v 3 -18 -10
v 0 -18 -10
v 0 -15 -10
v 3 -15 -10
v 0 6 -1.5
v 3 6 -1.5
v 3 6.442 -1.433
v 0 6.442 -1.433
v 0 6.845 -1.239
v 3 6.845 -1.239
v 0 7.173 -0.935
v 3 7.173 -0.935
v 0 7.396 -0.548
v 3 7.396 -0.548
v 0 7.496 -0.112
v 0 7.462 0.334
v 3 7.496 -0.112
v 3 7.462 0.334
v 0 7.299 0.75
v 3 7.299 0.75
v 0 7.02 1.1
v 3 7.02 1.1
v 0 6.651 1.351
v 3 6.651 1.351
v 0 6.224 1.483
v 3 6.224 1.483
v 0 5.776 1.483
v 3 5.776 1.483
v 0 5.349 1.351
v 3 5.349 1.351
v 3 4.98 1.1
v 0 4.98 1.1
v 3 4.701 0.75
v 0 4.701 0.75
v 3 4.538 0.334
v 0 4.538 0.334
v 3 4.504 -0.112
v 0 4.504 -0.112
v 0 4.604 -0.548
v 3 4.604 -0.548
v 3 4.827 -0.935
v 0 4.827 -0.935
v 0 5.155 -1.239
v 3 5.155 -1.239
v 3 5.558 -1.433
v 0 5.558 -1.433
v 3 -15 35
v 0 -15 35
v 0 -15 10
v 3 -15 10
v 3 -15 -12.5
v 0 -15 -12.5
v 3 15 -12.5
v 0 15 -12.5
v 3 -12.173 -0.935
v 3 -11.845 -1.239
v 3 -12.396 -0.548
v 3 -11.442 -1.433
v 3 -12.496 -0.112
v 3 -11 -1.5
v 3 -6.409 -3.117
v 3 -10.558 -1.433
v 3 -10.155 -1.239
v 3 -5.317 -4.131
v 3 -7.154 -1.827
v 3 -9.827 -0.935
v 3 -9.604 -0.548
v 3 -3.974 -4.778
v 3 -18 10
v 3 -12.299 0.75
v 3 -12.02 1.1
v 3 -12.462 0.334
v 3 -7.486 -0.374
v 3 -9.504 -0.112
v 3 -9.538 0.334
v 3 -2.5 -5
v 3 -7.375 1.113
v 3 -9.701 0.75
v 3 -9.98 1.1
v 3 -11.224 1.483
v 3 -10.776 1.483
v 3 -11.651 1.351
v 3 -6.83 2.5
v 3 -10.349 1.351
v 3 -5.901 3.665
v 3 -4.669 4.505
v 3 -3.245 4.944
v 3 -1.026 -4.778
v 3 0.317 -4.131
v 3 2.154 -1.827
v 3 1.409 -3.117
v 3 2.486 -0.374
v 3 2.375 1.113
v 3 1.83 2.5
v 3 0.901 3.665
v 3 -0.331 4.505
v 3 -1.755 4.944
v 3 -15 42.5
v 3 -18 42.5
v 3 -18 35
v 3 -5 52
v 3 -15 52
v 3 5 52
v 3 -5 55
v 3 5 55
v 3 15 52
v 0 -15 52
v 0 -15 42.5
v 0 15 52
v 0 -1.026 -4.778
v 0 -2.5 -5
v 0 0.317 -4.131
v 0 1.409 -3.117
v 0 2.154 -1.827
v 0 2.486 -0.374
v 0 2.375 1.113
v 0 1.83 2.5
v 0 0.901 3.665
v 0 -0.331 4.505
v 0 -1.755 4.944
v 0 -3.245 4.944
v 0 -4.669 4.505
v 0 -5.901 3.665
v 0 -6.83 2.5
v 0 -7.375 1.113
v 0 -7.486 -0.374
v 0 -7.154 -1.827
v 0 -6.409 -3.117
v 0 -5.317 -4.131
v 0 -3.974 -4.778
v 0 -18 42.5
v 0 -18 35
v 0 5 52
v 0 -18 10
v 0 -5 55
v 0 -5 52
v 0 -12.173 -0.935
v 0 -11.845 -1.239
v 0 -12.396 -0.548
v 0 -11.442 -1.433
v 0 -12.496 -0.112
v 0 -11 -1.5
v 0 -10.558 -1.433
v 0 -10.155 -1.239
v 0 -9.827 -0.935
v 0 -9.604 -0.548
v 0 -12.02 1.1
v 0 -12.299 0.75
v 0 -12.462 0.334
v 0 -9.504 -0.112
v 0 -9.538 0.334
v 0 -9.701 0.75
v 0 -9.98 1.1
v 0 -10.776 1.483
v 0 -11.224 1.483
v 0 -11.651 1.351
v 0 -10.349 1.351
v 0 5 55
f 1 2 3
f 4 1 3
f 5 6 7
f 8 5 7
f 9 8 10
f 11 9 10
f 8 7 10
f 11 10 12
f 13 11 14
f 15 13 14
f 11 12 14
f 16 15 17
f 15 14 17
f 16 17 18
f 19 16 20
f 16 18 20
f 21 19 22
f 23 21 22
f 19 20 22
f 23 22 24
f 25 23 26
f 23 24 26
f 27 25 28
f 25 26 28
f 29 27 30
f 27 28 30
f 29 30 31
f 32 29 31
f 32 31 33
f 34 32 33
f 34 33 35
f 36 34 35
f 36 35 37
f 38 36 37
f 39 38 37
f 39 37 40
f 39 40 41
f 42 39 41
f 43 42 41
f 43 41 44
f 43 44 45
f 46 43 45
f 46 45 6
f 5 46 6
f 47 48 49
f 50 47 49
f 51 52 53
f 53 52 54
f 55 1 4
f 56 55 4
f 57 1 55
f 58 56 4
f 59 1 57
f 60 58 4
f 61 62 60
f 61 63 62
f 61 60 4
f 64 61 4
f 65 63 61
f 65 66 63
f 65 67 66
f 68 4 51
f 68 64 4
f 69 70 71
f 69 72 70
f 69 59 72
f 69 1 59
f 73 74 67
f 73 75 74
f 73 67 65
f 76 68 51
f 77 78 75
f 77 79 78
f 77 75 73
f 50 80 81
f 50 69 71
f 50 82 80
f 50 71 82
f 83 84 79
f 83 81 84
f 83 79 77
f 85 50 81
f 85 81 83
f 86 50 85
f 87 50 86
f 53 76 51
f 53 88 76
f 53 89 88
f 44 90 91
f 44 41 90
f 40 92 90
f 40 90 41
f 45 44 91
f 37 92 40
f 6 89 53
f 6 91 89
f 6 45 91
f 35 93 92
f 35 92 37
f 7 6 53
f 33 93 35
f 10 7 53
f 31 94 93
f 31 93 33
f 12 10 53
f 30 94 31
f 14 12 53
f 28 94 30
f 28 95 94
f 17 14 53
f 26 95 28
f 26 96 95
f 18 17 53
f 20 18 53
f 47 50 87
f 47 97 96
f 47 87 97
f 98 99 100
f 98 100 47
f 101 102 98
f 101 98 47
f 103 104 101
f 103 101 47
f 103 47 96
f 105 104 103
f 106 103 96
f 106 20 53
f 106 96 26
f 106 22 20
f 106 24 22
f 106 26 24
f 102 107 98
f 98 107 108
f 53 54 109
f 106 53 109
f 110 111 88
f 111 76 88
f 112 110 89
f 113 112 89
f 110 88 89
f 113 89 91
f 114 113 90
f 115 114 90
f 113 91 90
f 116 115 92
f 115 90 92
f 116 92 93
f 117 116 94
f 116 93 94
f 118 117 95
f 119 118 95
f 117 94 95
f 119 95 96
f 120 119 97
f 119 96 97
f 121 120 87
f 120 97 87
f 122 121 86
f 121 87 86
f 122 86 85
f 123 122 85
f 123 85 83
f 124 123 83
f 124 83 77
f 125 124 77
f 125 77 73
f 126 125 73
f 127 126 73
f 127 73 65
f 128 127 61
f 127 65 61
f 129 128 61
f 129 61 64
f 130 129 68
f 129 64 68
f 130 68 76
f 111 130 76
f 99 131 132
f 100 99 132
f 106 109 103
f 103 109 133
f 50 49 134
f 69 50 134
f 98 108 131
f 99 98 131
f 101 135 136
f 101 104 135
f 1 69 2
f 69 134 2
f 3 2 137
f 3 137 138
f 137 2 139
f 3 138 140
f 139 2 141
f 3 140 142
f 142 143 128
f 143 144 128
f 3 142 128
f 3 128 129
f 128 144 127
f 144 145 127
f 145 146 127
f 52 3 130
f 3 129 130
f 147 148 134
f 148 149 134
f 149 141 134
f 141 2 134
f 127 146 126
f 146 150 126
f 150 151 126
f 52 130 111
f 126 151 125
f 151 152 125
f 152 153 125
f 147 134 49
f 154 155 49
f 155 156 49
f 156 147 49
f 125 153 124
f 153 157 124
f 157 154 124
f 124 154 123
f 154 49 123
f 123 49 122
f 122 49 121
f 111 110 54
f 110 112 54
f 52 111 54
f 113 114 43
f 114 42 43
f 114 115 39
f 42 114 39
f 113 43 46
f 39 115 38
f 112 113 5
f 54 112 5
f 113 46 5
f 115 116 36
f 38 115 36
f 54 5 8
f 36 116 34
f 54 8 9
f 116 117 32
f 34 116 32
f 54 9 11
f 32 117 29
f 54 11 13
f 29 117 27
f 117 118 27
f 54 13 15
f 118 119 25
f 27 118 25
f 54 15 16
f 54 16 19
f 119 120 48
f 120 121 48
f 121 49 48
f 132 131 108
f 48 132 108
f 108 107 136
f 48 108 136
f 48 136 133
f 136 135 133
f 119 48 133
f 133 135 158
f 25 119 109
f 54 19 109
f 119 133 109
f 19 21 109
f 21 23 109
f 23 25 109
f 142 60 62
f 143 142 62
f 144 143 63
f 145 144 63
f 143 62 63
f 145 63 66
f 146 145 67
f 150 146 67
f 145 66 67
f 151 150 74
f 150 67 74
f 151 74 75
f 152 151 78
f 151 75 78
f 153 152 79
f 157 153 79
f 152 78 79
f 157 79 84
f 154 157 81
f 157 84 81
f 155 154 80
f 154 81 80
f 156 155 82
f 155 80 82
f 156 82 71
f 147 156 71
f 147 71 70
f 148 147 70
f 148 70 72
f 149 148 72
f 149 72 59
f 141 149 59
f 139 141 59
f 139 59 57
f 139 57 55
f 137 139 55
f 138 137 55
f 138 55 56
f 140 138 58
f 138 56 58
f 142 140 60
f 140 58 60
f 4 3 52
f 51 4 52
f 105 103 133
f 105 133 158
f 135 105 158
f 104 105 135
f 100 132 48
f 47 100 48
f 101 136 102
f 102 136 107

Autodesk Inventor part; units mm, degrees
ref_plane "YZ Plane" through (0, 0, 0) normal (1, 0, 0) x (0, 1, 0)
ref_plane "XZ Plane" through (0, 0, 0) normal (0, 1, 0) x (-1, 0, 0)
ref_plane "XY Plane" through (0, 0, 0) normal (0, 0, 1) x (1, 0, 0)
sketch "Sketch1" plane through (0, 0, 0) normal (1, 0, 0) x (0, 1, 0)
  line L0 (15, 52) -> (-15, 52)
  line L1 (-15, 52) -> (-15, -12.5)
  line L2 (-15, -12.5) -> (15, -12.5)
  line L3 (15, -12.5) -> (15, 52)
  line L4 (-15, 10) -> (-18, 10)
  line L5 (-18, 10) -> (-18, -10)
  line L6 (-18, -10) -> (-15, -10)
  line L7 (-15, -10) -> (-15, 10)
  line L8 (-15, 42.5) -> (-18, 42.5)
  line L9 (-18, 42.5) -> (-18, 35)
  line L10 (-18, 35) -> (-15, 35)
  line L11 (-15, 35) -> (-15, 42.5)
  point P0 (0, 0)
  point P1 (0, -12.5)
  point P2 (-18, 0)
  dimension "d0" = 52
  dimension "d1" = 12.5
  dimension "d2" = 3
  dimension "d3" = 20
  dimension "d4" = 7.5
  dimension "d5" = 25
  dimension "d8" = 30
extrude "Extrusion1" add sketch "Sketch1" along normal blind 3
sketch "Sketch2" plane through (3, 0, 0) normal (1, 0, 0) x (0, 0, -1)
  circle A0 centre (0, -2.5) radius 5
  circle A1 centre (0, 6) radius 1.5
  circle A2 centre (0, -11) radius 1.5
  line L0 (-10, -18) -> (10, -18) projected
  line L1 (-35, -15) -> (-10, -15) projected
  point P0 (0, -18)
  dimension "d9" = 10
  dimension "d10" = 3
  dimension "d11" = 3
  dimension "d12" = 17
  dimension "d13" = 8.5
  dimension "d20" = 12.5
extrude "Extrusion2" cut sketch "Sketch2" against normal blind 3
sketch "Sketch3" plane through (3, 0, 0) normal (1, 0, 0) x (0, 0, -1)
  line L0 (-52, 15) -> (-52, -15) projected
  line L1 (-52, 5) -> (-55, 5)
  line L2 (-55, 5) -> (-55, -5)
  line L3 (-55, -5) -> (-52, -5)
  line L4 (-52, -5) -> (-52, 5)
  point P0 (0, 0)
  point P1 (-55, 0)
  dimension "d16" = 3
  dimension "d17" = 10
extrude "Extrusion3" add sketch "Sketch3" against normal blind 3
equation "\"d13\" = 0.5 * d12"
properties part number "Motor support"
